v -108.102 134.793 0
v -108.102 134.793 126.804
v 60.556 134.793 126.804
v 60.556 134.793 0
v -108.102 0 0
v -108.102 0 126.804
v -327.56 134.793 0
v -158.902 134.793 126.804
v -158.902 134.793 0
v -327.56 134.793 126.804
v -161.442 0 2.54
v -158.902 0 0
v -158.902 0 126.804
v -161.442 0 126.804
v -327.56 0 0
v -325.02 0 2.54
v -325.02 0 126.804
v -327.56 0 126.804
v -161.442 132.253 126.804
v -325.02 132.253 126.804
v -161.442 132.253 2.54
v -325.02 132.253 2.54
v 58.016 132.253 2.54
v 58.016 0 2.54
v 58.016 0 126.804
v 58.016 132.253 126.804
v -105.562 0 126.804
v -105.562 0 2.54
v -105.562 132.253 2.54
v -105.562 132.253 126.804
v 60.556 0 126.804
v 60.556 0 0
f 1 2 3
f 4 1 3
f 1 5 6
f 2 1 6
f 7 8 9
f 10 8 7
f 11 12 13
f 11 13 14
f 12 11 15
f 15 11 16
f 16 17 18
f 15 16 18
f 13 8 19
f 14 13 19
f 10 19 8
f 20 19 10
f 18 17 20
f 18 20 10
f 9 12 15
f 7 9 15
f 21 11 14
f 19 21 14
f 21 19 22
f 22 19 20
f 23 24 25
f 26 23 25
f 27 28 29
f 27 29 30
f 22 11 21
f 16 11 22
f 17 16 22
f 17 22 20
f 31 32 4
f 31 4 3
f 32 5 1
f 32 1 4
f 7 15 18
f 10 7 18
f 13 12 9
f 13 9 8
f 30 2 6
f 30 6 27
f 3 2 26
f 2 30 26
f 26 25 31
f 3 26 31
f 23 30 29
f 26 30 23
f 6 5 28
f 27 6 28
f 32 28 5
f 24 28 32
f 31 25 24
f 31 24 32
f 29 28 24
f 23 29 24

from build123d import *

# Parameters (mm, degrees)
F0_W     = 168.65819
F0_H     = 126.804486
F1_DEPTH = 134.793406
F2_T     = -2.54


with BuildPart() as f1:
    # F0 (on Front) → F1 (new body)
    with BuildSketch(Plane.XZ):
        with Locations((-23.772966, 63.402243)):
            Rectangle(F0_W, F0_H)
    extrude(amount=-F1_DEPTH)

    # F2
    f2_openings = [f1.faces().sort_by_distance(p)[0] for p in [
        (-23.772966, 0, 63.402243),
        (-23.772966, 67.396703, 126.804486),
    ]]
    offset(amount=F2_T, openings=f2_openings)


with BuildPart() as f4_1:
    # F4: instance of F1
    add(f1.part.mirror(Plane(origin=(-133.502061, 67.396703, 63.402243), x_dir=(0, -1, 0), z_dir=(-1, 0, 0))))


solid = Compound([f1.part, f4_1.part])
